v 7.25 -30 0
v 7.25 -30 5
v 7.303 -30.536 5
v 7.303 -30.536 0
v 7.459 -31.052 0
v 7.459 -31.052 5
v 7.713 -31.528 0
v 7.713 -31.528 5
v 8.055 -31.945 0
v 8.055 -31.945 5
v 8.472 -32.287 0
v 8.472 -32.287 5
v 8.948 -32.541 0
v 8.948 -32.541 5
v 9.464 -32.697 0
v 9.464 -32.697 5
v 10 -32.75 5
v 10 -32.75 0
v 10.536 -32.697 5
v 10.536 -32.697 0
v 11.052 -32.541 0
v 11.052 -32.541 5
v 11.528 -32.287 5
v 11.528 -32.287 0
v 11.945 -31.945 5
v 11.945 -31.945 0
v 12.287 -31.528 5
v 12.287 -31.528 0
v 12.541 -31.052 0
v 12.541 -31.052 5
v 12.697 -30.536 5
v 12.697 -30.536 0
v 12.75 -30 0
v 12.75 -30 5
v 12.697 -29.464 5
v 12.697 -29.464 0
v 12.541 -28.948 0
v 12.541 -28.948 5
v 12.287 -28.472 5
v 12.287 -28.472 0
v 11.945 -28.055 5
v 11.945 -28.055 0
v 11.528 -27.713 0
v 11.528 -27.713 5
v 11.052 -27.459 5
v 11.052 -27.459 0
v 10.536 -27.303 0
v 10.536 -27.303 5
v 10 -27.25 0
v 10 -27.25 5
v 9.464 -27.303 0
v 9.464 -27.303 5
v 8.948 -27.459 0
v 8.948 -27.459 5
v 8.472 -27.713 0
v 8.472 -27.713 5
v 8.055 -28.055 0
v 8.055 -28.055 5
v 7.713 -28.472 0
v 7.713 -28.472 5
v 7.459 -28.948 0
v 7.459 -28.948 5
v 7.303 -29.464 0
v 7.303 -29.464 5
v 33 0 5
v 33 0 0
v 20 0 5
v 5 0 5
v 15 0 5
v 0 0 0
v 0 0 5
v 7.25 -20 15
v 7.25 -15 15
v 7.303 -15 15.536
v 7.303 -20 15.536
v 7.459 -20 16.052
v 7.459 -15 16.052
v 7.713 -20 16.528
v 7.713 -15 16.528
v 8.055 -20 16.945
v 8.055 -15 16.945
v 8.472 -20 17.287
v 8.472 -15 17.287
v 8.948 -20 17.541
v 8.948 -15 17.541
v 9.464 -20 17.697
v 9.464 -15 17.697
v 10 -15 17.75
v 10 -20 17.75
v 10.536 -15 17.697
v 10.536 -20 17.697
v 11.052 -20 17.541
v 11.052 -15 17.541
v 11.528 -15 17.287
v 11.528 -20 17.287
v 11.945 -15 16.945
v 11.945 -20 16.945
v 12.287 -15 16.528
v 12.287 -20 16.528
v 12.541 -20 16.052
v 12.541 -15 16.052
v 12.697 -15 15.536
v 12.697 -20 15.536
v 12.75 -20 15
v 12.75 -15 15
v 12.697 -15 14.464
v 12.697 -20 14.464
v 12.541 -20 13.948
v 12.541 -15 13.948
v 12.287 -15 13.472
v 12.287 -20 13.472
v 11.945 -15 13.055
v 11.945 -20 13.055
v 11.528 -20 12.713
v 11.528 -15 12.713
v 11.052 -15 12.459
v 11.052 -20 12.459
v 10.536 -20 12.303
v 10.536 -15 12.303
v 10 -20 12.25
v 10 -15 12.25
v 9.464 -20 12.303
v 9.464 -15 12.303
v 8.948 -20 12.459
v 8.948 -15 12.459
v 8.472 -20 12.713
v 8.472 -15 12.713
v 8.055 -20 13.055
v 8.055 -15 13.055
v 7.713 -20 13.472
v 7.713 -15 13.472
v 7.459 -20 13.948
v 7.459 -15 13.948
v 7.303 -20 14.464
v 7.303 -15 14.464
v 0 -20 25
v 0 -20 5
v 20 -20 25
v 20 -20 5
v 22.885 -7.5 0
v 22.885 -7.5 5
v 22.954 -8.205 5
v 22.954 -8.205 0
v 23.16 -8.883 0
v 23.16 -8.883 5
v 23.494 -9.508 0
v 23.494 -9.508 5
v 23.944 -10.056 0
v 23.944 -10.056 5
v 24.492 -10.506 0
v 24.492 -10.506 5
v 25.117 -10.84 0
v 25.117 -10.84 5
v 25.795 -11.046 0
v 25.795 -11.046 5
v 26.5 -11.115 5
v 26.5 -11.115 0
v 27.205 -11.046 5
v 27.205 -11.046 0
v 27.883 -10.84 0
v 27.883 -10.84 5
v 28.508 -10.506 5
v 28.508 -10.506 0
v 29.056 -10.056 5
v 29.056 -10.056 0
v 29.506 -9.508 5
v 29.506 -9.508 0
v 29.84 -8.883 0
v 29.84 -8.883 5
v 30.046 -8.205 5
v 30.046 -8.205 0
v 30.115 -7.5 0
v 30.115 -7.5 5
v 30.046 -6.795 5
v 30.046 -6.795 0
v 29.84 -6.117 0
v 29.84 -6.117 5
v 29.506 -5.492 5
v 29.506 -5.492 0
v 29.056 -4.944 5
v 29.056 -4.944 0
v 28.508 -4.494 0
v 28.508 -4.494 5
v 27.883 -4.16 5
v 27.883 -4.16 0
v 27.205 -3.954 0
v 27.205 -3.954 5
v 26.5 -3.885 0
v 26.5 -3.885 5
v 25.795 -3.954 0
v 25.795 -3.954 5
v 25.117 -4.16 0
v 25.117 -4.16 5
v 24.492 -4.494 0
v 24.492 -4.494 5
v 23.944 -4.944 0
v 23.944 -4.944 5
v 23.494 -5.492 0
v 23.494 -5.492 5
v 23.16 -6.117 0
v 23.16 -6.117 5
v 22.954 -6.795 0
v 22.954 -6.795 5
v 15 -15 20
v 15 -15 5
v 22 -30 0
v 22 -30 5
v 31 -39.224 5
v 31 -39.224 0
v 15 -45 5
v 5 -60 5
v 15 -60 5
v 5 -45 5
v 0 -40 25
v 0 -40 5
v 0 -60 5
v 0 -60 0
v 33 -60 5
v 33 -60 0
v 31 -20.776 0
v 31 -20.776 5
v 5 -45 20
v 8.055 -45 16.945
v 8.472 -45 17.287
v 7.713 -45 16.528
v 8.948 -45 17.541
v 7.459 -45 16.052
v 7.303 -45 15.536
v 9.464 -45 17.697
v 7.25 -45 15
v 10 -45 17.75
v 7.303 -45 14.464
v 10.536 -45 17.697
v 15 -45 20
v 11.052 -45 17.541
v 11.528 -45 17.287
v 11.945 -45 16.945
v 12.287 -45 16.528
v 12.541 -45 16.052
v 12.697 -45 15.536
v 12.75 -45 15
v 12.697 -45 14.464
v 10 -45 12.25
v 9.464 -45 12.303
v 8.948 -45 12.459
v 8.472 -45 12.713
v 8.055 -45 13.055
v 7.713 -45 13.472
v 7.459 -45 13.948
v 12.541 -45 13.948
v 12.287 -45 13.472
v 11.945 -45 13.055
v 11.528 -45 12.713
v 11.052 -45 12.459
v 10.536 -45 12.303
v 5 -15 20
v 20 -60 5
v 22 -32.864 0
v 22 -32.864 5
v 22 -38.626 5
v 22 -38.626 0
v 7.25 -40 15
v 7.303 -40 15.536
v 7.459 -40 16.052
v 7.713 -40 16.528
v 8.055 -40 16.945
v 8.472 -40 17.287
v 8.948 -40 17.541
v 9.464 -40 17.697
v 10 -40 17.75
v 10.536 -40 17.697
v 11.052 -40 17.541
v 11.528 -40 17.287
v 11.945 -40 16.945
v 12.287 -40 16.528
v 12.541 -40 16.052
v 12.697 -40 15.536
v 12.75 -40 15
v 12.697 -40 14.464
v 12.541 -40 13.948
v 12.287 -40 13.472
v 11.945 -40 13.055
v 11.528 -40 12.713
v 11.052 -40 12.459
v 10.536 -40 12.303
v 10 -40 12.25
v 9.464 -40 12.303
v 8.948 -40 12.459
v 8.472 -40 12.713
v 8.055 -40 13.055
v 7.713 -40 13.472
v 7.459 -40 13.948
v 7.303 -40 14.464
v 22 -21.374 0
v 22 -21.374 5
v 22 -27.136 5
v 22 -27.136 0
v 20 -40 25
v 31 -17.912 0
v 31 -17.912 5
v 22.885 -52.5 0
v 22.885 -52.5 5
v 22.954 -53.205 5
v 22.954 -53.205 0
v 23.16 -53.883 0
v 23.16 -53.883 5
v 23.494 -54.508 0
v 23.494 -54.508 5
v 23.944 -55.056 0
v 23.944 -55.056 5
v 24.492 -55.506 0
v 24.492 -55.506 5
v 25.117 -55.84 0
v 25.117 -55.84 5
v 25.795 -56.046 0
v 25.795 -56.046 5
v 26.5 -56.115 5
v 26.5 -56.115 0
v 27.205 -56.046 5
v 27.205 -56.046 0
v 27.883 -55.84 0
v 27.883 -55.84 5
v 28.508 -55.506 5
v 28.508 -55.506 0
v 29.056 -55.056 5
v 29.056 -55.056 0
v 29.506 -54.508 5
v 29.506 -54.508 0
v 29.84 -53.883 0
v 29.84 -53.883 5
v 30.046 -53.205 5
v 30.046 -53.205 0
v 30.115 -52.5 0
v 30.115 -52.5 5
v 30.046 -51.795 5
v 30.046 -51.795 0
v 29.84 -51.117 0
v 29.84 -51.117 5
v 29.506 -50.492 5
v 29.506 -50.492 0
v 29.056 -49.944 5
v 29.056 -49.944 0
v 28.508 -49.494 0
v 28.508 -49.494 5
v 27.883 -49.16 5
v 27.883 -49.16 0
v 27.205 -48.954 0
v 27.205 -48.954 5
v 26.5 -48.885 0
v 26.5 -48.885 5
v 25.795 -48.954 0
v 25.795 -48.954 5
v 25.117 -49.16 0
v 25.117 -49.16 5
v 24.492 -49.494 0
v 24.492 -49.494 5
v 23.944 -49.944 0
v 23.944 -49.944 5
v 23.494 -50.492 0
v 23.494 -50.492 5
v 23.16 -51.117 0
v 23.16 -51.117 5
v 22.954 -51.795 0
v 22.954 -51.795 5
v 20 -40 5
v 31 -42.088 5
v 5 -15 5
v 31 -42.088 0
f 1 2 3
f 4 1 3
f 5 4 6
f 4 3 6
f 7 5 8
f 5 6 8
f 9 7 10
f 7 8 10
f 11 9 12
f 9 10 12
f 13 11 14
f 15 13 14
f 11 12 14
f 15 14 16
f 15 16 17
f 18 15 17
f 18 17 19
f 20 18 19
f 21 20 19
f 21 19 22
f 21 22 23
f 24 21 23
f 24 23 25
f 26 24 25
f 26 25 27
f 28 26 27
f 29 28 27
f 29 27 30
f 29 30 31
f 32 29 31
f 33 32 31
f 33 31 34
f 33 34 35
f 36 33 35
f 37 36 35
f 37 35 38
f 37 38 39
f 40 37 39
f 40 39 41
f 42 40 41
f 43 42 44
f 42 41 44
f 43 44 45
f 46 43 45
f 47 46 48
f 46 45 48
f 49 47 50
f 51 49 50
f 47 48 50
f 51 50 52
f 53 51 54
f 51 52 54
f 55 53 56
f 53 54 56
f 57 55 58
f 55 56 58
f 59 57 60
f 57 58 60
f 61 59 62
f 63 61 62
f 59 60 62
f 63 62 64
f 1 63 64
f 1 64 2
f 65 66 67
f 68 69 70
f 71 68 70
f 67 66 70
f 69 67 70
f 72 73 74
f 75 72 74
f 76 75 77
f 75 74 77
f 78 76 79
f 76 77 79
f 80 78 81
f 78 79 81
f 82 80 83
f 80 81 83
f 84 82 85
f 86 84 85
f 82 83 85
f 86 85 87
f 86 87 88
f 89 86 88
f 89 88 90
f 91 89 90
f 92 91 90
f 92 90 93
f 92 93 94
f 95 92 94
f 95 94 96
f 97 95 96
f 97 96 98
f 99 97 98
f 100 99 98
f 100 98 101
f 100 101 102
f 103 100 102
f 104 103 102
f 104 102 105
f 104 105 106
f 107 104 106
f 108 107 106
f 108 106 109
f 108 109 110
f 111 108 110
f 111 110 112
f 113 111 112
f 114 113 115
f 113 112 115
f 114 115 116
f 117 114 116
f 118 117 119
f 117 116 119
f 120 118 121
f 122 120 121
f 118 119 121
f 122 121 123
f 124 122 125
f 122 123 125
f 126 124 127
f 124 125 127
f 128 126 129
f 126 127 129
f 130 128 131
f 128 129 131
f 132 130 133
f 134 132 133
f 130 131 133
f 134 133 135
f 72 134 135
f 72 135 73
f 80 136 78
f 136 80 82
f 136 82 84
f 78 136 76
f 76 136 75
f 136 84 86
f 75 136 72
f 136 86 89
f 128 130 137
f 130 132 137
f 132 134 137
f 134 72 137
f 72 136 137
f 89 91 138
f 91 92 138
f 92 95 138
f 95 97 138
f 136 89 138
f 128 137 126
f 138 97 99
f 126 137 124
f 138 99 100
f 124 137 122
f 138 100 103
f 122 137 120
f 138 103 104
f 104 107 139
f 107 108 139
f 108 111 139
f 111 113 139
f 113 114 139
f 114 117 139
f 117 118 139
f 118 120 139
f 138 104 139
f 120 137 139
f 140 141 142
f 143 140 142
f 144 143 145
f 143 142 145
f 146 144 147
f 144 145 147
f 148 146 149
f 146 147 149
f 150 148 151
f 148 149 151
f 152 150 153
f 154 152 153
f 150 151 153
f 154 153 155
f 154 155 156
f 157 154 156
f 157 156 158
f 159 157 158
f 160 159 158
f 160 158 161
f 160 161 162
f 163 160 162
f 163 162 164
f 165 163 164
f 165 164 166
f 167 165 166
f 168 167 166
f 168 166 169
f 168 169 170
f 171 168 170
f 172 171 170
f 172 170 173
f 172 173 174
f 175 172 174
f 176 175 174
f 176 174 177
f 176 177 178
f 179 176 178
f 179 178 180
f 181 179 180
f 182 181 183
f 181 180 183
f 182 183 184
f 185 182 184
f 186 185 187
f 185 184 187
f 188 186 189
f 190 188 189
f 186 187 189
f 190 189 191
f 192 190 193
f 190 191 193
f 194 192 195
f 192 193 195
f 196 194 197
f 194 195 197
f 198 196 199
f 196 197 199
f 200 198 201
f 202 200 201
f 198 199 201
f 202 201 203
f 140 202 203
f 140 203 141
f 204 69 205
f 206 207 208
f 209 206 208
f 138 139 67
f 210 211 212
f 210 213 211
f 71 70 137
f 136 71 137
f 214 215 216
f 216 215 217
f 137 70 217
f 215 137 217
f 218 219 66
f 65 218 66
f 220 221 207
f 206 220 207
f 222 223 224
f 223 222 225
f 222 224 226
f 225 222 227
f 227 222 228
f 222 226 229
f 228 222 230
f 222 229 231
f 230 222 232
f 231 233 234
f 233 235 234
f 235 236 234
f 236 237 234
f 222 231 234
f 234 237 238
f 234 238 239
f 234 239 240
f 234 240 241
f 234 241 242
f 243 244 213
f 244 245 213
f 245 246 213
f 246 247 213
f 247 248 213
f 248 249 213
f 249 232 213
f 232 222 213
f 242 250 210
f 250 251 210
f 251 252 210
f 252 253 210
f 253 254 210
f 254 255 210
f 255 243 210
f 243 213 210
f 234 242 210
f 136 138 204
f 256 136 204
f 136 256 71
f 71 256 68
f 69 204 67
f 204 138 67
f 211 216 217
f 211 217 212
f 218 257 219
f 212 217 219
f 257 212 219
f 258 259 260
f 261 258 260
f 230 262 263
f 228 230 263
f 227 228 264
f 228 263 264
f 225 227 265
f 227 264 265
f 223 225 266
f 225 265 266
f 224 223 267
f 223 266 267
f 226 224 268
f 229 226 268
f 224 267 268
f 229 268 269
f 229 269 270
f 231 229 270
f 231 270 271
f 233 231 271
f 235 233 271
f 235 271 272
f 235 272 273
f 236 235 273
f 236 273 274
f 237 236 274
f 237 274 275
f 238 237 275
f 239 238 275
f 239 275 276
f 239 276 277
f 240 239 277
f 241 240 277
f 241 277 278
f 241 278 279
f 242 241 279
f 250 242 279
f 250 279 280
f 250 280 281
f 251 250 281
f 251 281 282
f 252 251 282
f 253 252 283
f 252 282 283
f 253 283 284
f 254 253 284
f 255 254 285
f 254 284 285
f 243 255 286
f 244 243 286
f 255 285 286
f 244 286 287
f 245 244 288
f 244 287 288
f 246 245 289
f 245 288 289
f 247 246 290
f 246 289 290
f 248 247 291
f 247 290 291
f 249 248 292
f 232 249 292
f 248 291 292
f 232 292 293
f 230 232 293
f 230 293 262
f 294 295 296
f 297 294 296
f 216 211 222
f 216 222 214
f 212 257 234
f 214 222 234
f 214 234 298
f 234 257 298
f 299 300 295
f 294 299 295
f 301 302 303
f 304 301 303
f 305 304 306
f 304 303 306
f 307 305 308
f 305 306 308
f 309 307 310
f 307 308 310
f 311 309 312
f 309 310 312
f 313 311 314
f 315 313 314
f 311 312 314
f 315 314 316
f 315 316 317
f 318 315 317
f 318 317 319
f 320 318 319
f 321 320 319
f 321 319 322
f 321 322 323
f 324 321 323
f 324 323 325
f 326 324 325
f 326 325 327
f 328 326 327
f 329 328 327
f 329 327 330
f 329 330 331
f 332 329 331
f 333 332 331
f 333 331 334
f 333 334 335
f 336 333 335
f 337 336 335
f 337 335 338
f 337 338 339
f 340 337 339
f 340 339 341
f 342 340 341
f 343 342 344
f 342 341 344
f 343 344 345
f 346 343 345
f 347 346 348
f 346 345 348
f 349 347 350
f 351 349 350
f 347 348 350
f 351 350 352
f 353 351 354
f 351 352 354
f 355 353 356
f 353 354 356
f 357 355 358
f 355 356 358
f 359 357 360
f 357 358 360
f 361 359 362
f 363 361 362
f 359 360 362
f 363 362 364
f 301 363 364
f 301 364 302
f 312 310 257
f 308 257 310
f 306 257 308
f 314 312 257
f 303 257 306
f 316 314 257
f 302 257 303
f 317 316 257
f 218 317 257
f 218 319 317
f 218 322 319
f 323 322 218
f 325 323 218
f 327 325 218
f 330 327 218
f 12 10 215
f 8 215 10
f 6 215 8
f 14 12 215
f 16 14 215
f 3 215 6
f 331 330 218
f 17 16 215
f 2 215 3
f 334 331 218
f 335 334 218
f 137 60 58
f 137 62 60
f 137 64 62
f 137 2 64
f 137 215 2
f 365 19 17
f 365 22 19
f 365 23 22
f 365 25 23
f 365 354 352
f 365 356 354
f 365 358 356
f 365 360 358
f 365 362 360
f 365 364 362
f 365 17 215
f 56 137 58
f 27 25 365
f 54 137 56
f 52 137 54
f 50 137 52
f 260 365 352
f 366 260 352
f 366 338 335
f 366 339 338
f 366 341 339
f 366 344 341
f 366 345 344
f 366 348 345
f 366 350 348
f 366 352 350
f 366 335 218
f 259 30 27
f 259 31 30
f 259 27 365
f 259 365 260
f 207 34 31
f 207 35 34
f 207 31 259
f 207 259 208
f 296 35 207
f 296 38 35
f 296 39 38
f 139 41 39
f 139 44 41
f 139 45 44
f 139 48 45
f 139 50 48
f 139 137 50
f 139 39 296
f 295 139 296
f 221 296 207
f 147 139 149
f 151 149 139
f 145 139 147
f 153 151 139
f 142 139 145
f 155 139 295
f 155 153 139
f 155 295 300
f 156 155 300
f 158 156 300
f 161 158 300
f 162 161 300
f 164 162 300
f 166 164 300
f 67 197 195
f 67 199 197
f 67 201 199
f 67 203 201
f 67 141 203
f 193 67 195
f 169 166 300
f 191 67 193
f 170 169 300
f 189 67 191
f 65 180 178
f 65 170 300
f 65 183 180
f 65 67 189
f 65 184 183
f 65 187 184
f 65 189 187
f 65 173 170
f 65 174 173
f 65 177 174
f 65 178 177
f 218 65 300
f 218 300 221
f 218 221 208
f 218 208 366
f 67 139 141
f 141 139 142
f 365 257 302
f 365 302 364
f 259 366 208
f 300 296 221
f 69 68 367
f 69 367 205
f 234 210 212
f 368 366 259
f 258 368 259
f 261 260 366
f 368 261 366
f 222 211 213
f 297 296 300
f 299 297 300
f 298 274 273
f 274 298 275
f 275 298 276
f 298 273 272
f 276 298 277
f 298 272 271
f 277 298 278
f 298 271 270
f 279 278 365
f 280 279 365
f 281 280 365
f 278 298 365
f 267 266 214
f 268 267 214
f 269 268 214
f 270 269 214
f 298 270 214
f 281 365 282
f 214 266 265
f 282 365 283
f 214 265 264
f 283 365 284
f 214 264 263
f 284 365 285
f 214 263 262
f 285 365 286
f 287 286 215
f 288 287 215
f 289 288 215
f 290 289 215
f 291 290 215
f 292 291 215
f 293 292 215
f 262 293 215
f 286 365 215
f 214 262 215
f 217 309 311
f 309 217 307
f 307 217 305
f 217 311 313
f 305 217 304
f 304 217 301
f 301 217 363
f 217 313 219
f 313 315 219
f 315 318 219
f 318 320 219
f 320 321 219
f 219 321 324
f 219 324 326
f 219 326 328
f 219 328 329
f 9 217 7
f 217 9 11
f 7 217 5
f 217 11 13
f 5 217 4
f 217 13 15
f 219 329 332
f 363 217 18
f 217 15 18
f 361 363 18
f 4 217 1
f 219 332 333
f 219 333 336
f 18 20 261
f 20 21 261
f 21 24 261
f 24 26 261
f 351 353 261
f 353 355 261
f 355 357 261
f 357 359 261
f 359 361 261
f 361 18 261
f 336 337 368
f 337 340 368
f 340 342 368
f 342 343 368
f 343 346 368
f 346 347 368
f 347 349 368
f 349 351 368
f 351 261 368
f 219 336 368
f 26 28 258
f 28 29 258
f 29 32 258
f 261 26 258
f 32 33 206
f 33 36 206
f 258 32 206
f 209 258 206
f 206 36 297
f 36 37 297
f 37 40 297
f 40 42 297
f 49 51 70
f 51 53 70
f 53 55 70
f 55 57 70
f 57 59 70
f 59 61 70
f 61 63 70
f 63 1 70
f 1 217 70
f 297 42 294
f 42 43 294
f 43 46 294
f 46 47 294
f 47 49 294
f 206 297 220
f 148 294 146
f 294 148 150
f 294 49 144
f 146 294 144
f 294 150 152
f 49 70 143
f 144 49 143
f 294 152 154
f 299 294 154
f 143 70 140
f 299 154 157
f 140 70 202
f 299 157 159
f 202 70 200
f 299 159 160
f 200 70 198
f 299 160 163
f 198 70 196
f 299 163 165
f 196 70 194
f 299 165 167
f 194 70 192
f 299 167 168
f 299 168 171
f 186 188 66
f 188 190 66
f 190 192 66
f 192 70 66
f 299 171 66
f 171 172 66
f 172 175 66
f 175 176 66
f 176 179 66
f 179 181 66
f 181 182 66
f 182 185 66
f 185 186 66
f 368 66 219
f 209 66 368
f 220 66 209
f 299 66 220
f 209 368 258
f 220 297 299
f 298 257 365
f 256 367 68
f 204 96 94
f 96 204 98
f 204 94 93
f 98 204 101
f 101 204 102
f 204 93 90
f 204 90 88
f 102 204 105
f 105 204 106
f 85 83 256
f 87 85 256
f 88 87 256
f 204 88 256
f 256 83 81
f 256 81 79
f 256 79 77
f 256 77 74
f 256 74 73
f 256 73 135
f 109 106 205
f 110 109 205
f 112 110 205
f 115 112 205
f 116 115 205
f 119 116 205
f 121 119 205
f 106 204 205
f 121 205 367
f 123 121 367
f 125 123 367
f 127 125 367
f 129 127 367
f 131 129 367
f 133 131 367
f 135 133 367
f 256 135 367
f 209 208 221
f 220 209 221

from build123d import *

# Parameters (mm, degrees)
F1_DEPTH = 5
F3_DEPTH = 20
F5_DEPTH = 20.001
F7_D     = 7.23
F9_DEPTH = 5.001
F10_D    = 5.5
F11_D    = 5.5


with BuildPart() as f1:
    # F0 (on Top) → F1 (new body)
    with BuildSketch(Plane.XY):
        Polygon((33, 0), (0, 0), (0, -60), (33, -60), (33, -45), (33, -15), align=None)
    extrude(amount=F1_DEPTH)

    # F2 (on face) → F3 (join)
    with BuildSketch(Plane.XY.offset(5)):
        Polygon((0, -20), (20, -20), (20, 0), (15, 0), (15, -15), (5, -15), (5, 0), (0, 0), align=None)
        Polygon((20, -40), (0, -40), (0, -60), (5, -60), (5, -45), (15, -45), (15, -60), (20, -60), align=None)
    extrude(amount=F3_DEPTH)

    # F4 (on face) → F5 (cut, through all)
    with BuildSketch(Plane.YZ.offset(20)):
        Polygon((0, 25), (-20, 25), (0, 5), align=None)
        Polygon((-60, 5), (-40, 25), (-60, 25), align=None)
    extrude(amount=-F5_DEPTH, mode=Mode.SUBTRACT)

    # F7 (through all)
    with Locations(Plane(origin=(0, 0, 0), x_dir=(1, 0, 0), z_dir=(0, 0, -1))):
        with Locations((26.5, 7.5), (26.5, 52.5)):
            Hole(F7_D / 2)

    # F8 (on face) → F9 (cut, through all)
    with BuildSketch(Plane.XY.offset(5)):
        Polygon((31, -39.2240850911), (31, -20.7759149089), (22, -30), align=None)
        Polygon((22, -27.136144826), (31, -17.912059735), (22, -21.3735981965), align=None)
        Polygon((22, -32.863855174), (22, -38.6264018035), (31, -42.087940265), align=None)
    extrude(amount=-F9_DEPTH, mode=Mode.SUBTRACT)

    # F10 (through all)
    with Locations(Plane(origin=(0, 0, 0), x_dir=(1, 0, 0), z_dir=(0, 0, -1))):
        with Locations((10, 30)):
            Hole(F10_D / 2)

    # F11 (through all)
    with Locations(Plane.XZ.offset(45)):
        with Locations((10, 15)):
            Hole(F11_D / 2)


solid = f1.part
